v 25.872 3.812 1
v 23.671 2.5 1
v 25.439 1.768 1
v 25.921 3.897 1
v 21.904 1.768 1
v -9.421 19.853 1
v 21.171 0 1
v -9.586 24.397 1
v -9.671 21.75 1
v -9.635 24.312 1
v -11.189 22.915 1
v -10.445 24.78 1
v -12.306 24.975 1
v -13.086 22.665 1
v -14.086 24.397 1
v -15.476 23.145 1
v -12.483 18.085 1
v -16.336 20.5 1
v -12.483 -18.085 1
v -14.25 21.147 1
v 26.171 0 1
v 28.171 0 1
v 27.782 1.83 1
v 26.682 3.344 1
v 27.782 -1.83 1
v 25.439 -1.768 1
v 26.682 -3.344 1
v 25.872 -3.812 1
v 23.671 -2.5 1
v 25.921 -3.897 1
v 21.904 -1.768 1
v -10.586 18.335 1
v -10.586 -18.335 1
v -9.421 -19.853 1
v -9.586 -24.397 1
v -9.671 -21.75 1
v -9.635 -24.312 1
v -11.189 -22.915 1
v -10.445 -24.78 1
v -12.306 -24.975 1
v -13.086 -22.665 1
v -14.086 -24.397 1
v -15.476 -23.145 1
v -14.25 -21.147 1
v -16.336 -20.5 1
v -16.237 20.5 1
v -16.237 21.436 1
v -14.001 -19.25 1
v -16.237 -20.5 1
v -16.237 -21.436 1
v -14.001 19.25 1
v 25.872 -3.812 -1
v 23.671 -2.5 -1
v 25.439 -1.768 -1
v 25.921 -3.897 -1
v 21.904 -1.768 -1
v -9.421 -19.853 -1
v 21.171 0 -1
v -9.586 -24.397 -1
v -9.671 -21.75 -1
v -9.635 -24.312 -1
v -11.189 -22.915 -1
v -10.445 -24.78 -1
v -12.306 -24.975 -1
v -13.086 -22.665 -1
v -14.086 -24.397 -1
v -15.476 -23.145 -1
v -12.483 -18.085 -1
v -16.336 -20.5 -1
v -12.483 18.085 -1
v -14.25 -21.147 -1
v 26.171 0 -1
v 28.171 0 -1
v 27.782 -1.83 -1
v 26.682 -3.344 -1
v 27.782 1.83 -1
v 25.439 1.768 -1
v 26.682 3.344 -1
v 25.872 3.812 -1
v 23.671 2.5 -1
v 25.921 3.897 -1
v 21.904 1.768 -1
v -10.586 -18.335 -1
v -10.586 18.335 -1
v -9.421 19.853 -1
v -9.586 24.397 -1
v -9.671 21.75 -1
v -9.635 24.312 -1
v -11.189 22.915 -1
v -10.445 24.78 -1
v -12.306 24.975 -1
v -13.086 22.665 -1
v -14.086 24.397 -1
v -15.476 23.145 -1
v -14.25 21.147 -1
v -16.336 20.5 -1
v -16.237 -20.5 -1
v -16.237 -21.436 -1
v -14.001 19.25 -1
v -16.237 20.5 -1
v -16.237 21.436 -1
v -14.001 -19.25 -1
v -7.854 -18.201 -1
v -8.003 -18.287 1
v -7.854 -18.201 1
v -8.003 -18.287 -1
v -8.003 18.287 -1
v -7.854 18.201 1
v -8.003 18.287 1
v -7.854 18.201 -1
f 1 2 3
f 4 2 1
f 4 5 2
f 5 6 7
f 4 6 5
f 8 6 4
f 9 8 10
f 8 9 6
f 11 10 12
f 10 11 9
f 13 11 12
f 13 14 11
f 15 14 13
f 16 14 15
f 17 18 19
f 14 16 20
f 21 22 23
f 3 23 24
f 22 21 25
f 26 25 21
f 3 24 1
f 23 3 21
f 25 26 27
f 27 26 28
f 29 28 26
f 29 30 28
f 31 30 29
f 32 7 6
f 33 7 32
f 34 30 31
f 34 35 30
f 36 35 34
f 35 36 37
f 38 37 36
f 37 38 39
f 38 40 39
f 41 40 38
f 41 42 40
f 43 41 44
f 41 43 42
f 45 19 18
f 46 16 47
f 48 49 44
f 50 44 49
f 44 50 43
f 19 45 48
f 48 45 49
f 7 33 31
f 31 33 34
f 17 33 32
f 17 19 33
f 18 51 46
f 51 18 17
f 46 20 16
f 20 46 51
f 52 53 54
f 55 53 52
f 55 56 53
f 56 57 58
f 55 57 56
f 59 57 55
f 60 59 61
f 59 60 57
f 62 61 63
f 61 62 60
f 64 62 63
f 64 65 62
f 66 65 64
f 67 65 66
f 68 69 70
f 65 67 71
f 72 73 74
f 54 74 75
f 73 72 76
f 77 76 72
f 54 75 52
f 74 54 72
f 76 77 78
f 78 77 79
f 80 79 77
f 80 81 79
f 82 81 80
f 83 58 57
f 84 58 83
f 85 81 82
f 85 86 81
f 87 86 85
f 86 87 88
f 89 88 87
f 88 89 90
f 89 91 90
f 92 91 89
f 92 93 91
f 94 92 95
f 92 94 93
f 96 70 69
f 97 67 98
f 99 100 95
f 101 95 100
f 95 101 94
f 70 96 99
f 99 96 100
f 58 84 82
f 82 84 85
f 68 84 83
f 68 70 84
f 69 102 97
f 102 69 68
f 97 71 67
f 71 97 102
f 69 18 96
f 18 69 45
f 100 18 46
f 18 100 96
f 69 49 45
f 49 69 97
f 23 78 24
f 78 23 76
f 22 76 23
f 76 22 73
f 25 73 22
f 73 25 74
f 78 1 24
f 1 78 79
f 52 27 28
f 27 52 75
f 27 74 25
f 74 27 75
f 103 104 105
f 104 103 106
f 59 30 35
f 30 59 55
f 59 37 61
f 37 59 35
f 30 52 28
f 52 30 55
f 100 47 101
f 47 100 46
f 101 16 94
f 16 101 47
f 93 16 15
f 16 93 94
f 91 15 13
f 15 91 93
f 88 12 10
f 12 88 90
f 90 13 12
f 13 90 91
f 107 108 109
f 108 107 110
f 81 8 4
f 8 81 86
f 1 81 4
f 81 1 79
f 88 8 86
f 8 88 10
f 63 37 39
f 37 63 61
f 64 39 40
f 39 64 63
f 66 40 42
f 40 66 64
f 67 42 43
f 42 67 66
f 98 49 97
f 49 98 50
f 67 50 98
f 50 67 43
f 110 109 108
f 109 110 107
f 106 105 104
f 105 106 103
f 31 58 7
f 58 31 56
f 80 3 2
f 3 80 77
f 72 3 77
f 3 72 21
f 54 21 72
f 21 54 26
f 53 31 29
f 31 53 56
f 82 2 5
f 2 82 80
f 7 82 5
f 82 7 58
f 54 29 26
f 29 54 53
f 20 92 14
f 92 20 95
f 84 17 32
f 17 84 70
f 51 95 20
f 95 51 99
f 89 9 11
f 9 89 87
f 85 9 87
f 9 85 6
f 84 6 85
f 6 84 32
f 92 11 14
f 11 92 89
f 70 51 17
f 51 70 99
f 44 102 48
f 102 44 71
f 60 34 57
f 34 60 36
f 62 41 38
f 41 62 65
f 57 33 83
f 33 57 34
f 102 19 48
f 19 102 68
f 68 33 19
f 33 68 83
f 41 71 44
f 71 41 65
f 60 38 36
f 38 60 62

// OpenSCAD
/*
Exercício 4 (Desafio)
Crie uma placa triangular com lado de 50mm, 2mm de espessura, furos 
de 5mm em cada canto, 2mm de margem entre os furos e a borda da placa e
com cantos arredondados.
*/

L=50;   //Lado da placa
D=5;    //Diametro do furo
M=2;    //Margem
E=2;    //Espessura

l=L-2*M-D;          //Lado do triângulo com os vertices no centro dos furos
Rl=l*sqrt(3)/3;     //Raio do circulo que inscreve o triângulo de lado l
Rf=D/2+M;           //Raio de arredondamento (fillet)

difference(){
    union(){
        cylinder(r=Rl,h=E,center=true,$fn=3);  //triangulo base
        for (i=[0:2]){
            rotate([0,0,i*120]){
                translate([-(Rf/2+Rl/2),0,0])
                    cube([Rf,l,E],center=true);     //retangulo anexado a cada lado do triangulo base
                translate([Rl, 0, 0]) 
                    cylinder(r=Rf, h=E, center=true);   //parte redonda de cada canto
            }
        }
    }
    for (i=[0:2]){
        rotate([0,0,i*120]){
            translate([Rl, 0, 0]) 
                cylinder(d=D, h=E+1, center=true);  //Os furos
        }
    }

}
